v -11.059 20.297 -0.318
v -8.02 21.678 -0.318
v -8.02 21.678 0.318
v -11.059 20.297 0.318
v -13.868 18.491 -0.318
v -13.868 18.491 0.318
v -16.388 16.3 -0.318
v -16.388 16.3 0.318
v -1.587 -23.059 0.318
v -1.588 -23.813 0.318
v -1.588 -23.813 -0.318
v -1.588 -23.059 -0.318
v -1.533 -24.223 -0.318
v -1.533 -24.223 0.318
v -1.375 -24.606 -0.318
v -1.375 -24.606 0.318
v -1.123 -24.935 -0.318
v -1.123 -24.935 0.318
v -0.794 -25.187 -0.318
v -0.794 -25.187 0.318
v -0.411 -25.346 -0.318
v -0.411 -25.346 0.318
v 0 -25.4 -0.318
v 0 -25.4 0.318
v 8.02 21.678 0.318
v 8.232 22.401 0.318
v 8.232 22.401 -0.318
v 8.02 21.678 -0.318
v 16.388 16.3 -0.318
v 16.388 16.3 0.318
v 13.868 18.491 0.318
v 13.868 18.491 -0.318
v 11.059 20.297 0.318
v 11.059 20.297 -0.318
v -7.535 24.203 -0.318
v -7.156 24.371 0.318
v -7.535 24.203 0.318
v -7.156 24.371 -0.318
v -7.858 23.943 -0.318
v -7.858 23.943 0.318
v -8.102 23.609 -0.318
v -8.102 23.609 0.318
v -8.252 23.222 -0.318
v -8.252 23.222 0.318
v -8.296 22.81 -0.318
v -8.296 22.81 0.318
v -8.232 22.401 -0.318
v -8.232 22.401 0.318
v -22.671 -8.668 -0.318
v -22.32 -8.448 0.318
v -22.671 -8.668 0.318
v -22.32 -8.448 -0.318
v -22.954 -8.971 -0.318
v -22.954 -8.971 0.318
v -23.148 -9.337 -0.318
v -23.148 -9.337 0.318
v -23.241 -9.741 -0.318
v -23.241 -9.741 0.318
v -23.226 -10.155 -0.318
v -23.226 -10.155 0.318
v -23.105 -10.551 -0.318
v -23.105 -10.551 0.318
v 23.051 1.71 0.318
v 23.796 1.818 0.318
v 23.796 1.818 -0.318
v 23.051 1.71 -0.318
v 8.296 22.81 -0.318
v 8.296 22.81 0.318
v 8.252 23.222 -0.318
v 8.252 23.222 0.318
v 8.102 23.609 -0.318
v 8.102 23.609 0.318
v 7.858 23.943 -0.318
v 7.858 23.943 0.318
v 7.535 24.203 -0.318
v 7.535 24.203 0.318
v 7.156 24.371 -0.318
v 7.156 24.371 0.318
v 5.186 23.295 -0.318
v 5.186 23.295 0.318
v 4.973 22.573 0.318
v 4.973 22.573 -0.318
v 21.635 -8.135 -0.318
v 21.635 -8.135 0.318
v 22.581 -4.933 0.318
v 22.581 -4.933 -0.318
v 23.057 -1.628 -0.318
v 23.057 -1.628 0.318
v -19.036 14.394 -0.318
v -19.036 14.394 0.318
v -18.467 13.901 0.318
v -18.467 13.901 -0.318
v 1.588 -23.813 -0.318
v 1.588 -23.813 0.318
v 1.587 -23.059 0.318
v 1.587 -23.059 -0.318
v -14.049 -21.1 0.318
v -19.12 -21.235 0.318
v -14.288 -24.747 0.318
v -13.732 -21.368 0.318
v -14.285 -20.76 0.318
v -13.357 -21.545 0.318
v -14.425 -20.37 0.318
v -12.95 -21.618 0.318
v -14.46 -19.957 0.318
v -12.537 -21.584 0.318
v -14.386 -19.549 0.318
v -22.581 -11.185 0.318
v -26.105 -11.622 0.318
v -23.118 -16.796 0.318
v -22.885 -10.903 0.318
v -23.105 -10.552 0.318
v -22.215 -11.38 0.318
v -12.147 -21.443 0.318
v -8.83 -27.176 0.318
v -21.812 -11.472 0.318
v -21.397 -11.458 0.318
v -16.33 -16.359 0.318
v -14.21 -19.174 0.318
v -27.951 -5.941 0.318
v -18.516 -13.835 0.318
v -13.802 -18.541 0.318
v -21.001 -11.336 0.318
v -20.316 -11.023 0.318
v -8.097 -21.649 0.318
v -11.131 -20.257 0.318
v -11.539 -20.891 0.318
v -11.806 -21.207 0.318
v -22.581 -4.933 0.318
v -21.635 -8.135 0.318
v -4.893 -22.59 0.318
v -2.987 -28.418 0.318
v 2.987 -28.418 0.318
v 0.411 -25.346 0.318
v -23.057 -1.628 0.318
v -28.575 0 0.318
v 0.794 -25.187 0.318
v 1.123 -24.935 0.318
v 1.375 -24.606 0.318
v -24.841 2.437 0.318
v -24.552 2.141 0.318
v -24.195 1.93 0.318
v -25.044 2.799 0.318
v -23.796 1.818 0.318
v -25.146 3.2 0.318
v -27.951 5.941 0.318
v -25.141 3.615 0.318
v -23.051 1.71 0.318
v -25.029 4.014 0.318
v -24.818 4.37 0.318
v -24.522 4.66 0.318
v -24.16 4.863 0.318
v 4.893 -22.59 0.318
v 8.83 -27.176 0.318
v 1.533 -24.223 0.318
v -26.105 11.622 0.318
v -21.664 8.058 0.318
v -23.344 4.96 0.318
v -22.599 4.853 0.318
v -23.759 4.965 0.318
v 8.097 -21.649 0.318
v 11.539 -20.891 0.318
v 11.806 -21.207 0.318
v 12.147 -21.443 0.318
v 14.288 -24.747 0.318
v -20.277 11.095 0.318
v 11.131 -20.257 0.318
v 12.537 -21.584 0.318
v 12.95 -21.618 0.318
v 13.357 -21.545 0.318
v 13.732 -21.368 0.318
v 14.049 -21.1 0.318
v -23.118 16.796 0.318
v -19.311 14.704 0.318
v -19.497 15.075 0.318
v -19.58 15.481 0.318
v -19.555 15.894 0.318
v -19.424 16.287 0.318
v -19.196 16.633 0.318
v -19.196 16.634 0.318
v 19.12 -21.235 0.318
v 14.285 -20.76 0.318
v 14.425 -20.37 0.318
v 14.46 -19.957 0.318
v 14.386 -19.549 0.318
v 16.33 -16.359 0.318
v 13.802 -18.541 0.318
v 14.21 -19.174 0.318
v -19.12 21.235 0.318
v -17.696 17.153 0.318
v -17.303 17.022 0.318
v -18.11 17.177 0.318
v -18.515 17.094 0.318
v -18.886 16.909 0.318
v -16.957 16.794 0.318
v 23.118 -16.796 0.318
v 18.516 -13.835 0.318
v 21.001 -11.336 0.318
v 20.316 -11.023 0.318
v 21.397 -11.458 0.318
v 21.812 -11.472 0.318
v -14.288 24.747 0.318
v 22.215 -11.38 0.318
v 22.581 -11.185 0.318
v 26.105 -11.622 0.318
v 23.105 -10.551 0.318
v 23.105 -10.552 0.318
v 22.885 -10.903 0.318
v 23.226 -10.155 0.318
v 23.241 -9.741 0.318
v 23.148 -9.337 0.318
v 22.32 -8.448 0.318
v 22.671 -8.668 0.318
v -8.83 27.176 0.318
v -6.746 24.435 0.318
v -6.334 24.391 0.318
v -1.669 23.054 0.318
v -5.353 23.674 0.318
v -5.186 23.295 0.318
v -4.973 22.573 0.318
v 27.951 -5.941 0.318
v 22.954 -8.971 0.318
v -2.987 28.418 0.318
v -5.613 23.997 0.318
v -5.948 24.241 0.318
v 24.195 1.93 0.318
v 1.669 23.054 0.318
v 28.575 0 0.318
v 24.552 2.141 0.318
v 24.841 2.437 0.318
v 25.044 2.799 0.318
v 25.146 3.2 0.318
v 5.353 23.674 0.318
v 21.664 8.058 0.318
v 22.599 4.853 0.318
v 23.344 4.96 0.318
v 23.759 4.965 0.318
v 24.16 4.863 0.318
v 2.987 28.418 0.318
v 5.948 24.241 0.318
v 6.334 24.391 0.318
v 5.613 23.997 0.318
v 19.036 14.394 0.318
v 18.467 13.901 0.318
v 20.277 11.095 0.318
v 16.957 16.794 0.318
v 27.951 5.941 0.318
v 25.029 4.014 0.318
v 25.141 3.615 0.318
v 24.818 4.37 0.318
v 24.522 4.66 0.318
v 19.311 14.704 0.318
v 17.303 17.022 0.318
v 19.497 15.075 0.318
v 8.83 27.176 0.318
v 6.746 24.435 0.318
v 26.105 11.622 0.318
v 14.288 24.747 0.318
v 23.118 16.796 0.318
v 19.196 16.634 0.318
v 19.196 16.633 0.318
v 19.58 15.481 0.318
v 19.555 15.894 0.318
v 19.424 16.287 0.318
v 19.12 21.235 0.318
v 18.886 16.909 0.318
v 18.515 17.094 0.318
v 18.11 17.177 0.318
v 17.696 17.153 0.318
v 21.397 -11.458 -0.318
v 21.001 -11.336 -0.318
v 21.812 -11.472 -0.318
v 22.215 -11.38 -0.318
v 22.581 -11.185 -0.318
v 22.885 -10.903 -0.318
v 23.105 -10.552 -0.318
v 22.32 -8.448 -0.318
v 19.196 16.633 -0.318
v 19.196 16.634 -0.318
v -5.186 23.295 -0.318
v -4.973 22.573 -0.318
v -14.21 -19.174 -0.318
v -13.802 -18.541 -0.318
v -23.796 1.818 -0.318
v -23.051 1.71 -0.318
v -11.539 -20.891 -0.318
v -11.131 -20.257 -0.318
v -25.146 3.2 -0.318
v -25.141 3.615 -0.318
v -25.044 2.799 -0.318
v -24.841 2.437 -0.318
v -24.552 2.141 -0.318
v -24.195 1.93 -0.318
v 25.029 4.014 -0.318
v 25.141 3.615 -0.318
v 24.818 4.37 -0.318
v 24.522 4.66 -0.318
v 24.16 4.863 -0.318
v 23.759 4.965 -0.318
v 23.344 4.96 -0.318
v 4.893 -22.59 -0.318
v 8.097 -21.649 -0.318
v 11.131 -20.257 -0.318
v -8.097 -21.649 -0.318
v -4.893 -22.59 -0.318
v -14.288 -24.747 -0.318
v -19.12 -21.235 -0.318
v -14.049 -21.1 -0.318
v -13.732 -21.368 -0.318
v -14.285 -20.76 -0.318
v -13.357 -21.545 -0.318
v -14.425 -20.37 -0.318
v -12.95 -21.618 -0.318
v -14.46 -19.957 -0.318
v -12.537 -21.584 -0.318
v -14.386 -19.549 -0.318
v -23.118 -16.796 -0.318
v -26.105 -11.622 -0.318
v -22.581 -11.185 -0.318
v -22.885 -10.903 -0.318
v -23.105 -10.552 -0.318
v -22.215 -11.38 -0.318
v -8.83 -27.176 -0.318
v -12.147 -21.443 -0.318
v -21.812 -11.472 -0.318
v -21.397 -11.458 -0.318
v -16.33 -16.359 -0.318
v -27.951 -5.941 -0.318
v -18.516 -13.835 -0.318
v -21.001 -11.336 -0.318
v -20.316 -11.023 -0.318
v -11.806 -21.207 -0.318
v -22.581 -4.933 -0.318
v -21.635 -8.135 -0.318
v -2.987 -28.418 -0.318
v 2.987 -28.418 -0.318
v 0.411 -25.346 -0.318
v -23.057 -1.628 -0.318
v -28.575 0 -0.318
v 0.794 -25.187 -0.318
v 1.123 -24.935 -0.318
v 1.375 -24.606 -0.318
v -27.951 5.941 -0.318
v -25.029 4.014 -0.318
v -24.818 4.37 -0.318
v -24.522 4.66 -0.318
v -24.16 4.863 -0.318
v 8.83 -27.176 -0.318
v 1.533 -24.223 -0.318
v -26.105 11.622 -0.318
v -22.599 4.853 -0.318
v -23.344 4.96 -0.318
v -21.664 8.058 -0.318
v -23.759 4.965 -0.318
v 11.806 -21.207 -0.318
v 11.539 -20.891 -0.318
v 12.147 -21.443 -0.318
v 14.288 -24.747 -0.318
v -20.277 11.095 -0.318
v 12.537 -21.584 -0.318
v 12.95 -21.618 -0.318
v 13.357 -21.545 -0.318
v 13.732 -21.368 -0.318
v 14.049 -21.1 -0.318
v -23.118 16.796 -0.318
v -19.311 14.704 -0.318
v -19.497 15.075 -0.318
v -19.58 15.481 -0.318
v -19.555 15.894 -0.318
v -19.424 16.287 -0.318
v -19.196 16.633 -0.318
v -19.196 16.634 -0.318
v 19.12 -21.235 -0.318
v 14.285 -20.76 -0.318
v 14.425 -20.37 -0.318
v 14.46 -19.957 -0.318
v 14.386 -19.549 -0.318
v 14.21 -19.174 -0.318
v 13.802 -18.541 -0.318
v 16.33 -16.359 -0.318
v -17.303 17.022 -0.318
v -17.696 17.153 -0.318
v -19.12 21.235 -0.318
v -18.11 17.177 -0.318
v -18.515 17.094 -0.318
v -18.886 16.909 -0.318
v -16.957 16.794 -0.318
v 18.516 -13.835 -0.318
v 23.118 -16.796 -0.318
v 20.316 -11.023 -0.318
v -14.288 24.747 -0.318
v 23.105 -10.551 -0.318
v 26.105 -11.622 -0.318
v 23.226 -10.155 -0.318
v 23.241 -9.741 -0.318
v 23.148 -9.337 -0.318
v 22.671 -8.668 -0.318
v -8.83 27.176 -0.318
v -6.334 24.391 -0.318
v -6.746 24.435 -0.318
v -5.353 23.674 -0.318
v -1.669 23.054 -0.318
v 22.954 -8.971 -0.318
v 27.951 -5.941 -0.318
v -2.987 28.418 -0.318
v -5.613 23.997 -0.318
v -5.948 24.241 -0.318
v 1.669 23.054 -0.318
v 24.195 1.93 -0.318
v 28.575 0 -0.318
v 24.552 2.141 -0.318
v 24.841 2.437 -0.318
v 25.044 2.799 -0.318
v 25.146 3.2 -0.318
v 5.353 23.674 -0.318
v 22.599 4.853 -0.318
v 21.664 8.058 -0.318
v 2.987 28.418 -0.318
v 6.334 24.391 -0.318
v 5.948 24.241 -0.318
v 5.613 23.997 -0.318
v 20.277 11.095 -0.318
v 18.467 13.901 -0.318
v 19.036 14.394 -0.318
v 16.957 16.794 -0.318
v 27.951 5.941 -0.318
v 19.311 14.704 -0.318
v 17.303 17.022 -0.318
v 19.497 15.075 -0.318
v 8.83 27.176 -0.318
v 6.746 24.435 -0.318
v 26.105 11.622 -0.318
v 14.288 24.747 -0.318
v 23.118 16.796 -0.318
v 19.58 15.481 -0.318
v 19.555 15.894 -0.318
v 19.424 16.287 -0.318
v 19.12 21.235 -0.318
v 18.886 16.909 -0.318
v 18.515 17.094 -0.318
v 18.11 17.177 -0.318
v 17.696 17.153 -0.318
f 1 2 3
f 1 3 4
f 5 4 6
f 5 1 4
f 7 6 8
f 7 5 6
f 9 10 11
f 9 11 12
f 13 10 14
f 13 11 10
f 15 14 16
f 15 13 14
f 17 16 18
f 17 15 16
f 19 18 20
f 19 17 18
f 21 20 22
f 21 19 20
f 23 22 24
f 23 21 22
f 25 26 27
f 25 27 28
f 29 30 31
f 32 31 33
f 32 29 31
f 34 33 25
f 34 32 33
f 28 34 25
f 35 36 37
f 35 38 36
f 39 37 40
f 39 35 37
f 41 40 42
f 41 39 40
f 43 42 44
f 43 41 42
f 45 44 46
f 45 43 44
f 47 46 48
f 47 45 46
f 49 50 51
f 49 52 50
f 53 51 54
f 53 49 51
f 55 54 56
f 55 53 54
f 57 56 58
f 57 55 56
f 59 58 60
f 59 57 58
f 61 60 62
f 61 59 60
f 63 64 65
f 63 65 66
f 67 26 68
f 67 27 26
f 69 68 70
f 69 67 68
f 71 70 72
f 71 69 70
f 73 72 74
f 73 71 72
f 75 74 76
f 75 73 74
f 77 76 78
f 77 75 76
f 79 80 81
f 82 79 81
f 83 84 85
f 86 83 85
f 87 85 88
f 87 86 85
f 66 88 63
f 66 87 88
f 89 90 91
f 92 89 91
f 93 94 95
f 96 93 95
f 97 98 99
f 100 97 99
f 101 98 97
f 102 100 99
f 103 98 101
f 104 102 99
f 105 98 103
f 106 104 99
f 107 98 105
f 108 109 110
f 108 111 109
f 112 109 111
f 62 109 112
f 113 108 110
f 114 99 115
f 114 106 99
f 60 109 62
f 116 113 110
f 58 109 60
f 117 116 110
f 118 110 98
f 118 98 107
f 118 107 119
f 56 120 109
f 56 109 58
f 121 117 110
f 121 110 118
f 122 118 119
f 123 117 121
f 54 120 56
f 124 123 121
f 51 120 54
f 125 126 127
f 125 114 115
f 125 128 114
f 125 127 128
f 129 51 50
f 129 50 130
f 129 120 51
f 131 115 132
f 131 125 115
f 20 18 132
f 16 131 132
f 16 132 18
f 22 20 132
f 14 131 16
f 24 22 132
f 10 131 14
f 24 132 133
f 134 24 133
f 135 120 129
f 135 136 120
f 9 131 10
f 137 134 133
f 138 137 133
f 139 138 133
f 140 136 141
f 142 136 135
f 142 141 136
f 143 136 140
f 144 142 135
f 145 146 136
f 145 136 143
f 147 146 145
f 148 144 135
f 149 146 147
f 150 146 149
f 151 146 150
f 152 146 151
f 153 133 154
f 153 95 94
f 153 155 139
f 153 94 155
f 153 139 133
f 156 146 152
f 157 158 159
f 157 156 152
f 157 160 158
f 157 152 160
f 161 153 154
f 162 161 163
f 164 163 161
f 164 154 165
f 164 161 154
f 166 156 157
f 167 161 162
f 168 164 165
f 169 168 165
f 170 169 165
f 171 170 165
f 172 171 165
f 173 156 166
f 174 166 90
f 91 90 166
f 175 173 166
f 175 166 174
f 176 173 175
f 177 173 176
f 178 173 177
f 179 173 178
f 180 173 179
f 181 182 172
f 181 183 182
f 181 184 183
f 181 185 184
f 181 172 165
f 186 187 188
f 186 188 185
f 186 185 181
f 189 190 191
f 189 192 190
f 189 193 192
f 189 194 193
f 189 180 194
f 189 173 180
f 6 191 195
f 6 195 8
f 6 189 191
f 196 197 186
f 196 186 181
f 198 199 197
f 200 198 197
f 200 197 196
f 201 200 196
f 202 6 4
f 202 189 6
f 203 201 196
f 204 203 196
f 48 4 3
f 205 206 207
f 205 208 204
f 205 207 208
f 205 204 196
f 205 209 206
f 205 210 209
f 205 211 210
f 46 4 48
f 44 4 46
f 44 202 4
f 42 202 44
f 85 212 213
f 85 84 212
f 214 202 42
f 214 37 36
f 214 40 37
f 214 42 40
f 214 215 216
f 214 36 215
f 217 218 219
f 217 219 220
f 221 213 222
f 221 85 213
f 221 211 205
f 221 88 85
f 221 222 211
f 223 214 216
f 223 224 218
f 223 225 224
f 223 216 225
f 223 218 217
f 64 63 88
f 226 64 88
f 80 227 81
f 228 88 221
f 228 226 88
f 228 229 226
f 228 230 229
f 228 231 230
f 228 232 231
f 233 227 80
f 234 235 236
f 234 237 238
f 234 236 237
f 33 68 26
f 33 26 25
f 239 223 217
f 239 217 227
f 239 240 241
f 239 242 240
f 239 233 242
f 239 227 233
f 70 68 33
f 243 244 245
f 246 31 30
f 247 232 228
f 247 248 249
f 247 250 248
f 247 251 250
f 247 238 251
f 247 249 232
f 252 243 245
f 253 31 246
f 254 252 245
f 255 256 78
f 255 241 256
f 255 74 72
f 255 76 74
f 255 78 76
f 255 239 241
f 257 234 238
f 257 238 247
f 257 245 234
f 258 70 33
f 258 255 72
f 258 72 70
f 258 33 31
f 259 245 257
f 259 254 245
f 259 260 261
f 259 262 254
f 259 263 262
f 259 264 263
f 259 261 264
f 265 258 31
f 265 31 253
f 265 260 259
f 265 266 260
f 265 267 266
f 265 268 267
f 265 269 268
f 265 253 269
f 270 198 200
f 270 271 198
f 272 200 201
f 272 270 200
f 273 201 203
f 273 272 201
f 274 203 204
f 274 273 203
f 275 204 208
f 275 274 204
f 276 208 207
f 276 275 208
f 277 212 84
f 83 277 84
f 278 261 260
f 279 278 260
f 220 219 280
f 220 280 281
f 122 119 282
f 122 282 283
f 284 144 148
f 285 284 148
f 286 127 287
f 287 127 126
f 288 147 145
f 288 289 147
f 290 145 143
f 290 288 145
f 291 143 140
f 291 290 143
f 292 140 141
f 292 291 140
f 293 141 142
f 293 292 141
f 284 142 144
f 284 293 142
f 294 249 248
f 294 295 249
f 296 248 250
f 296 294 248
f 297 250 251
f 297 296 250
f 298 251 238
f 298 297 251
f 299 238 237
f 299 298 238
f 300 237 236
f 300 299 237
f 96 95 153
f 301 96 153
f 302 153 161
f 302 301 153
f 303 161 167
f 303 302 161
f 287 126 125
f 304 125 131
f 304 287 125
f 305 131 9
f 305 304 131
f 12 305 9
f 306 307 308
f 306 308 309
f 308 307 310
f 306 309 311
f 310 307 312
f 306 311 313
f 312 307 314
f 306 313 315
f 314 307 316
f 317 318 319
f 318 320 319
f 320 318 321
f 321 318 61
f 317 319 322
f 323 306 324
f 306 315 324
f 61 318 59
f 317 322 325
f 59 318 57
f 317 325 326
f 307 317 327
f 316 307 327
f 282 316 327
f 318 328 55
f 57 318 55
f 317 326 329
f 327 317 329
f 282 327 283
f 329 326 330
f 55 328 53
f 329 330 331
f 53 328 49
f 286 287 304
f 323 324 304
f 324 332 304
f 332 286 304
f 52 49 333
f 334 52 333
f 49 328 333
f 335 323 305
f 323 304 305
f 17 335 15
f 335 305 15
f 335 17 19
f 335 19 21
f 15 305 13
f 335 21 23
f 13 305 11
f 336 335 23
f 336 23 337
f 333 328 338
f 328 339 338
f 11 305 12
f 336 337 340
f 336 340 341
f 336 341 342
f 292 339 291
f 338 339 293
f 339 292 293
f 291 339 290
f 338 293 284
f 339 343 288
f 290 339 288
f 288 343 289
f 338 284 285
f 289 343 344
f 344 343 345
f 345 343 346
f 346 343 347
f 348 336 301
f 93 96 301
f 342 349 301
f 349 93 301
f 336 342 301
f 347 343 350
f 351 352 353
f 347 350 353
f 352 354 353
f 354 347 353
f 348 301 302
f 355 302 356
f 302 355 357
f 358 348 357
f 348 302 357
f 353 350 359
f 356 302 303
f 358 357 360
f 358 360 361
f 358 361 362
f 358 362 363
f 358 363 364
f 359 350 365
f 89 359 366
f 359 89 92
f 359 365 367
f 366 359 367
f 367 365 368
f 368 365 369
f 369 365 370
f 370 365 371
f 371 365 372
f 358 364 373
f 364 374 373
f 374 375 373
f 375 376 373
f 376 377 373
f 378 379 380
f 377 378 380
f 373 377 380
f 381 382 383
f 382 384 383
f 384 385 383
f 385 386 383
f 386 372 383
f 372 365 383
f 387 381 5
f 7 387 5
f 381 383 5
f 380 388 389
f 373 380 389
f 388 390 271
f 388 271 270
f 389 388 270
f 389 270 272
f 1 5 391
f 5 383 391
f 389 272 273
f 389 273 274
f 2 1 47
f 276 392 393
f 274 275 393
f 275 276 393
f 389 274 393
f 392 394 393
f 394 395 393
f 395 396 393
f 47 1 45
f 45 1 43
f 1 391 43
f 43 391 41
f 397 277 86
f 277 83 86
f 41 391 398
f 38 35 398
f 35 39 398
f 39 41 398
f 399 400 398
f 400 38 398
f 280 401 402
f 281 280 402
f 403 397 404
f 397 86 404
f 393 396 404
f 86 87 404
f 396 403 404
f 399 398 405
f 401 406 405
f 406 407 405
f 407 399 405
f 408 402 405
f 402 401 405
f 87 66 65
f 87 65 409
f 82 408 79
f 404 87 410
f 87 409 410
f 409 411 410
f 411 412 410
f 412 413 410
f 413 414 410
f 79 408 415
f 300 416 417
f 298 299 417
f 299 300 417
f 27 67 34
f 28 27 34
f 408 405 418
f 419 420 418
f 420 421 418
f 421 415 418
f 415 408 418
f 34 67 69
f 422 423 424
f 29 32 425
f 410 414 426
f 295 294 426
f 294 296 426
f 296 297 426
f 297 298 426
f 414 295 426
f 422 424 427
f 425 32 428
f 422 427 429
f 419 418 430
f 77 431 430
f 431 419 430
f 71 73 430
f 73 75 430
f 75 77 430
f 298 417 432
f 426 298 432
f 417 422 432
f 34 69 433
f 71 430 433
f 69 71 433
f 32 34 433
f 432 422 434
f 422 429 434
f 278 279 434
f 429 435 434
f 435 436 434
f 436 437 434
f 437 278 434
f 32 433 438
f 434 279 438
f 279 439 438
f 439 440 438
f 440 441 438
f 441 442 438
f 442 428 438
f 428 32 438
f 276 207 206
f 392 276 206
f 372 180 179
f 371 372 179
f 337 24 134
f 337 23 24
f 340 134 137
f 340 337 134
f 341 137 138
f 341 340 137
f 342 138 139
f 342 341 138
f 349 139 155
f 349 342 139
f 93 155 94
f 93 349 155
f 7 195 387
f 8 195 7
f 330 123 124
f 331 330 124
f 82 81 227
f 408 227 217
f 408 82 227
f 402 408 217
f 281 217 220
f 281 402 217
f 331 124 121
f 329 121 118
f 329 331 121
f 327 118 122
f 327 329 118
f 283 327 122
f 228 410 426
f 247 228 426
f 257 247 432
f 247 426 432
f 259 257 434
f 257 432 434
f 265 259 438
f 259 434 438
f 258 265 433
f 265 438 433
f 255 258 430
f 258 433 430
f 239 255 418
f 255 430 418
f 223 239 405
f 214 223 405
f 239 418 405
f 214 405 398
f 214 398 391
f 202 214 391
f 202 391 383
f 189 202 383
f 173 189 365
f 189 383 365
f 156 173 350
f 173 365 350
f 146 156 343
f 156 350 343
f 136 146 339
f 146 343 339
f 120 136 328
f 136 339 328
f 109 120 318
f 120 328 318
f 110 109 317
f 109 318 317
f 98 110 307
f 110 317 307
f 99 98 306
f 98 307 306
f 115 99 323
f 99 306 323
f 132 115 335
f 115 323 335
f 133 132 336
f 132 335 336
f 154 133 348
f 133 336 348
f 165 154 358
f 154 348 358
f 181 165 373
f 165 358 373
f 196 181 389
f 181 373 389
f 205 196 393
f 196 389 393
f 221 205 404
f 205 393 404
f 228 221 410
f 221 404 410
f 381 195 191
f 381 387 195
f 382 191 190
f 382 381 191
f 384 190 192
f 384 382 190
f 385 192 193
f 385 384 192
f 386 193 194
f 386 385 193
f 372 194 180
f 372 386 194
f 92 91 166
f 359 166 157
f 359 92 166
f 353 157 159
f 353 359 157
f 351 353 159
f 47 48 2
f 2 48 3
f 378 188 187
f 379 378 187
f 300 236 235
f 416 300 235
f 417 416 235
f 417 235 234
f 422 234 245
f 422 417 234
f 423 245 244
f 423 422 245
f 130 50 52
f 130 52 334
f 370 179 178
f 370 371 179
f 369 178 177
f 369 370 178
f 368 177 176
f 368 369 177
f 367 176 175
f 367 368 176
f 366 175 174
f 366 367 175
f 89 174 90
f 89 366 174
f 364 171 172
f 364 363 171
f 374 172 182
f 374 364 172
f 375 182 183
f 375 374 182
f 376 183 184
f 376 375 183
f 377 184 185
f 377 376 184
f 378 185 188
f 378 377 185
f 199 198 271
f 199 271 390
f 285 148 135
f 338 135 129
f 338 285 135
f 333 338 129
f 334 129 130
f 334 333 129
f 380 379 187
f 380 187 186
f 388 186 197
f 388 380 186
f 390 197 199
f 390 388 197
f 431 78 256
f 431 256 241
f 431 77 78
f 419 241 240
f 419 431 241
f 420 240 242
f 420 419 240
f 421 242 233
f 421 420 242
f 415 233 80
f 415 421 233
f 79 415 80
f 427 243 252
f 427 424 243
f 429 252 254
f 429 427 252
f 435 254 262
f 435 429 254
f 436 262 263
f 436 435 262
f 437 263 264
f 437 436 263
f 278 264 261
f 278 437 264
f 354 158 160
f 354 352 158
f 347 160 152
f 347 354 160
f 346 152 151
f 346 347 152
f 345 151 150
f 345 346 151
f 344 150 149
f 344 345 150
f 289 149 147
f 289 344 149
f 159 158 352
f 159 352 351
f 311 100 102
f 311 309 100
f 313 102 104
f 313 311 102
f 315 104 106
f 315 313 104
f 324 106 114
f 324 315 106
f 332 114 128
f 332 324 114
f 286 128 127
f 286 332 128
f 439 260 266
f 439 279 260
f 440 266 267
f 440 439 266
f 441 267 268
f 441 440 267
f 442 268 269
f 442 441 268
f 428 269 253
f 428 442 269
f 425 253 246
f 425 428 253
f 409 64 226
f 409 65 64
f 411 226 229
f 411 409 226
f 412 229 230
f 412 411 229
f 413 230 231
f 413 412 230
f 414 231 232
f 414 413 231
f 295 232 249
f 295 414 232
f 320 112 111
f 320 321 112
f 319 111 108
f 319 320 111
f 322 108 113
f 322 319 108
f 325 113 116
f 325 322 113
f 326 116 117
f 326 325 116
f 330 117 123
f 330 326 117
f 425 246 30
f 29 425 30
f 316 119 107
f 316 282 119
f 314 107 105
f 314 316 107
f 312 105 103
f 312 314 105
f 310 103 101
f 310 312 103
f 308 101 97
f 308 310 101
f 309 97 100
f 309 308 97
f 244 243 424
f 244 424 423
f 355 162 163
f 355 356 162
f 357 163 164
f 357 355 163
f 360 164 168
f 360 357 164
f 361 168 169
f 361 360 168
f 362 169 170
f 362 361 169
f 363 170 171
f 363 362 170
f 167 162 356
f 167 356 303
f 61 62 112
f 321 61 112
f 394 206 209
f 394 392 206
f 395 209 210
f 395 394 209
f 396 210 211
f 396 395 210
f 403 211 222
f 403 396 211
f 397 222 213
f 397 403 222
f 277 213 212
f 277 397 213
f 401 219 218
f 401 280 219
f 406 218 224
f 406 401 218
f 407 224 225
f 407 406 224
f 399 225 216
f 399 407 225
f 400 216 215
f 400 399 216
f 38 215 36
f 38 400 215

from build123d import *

# Parameters (mm, degrees)
BOSS_EXTRUDE1_DEPTH      = 0.3175
BOSS_EXTRUDE1_DEPTH_BACK = 0.3175
SKETCH1_R                = 28.575
SKETCH1_R_2              = 23.114
SKETCH4_W                = 3.175
SKETCH4_H                = 6.35
CUT_EXTRUDE2_DEPTH       = 41.416141268
FILLET1_R                = 1.5875
CIRPATTERN1_COUNT        = 11
FILLET1_OF_CIRPATTERN1_R = 1.5875


with BuildPart() as part:
    # Sketch1 → Boss-Extrude1 (new, two sides: drawn at the far end of the back side and taken through both)
    with BuildSketch(Plane.XY.offset(-BOSS_EXTRUDE1_DEPTH_BACK)):
        Circle(SKETCH1_R)
        Circle(SKETCH1_R_2, mode=Mode.SUBTRACT)
    extrude(amount=BOSS_EXTRUDE1_DEPTH + BOSS_EXTRUDE1_DEPTH_BACK)

    # Sketch4 → Cut-Extrude2 (cut, through all)
    with BuildSketch(Plane.XY.offset(0.3175)):
        with Locations((0, -22.225)):
            Rectangle(SKETCH4_W, SKETCH4_H)
    cut_extrude2 = extrude(amount=-CUT_EXTRUDE2_DEPTH, mode=Mode.SUBTRACT)

    # Fillet1
    fillet1_edges = [part.edges().sort_by_distance(p)[0] for p in [
        (1.5875, -25.4, 0),
        (-1.5875, -25.4, 0),
    ]]
    fillet(fillet1_edges, radius=FILLET1_R - 0.0001)  # a hair under: the kernel refuses the full size

    # CirPattern1: Cut-Extrude2 ×11 about axis
    cirpattern1_axis = Axis((0, 0, 0), (0, 0, 1))
    for i in range(1, CIRPATTERN1_COUNT):
        add(cut_extrude2.rotate(cirpattern1_axis, i * 360 / CIRPATTERN1_COUNT), mode=Mode.SUBTRACT)

    # Fillet1 of CirPattern1
    fillet1_of_cirpattern1_edges = [part.edges().sort_by_distance(p)[0] for p in [
        (15.067766747, -20.509572436, 0),
        (12.39678678, -22.226107032, 0),
        (23.764124015, -9.107500538, 0),
        (22.445181349, -11.995582123, 0),
        (24.915539818, 5.186138431, 0),
        (25.36738943, 2.043455353, 0),
        (18.156447773, 17.833215091, 0),
        (20.235630604, 15.433710193, 0),
        (5.632811848, 24.818371964, 0),
        (8.679202039, 23.923871096, 0),
        (-8.679202039, 23.923871096, 0),
        (-5.632811848, 24.818371964, 0),
        (-20.235630604, 15.433710193, 0),
        (-18.156447773, 17.833215091, 0),
        (-25.36738943, 2.043455353, 0),
        (-24.915539818, 5.186138431, 0),
        (-22.445181349, -11.995582123, 0),
        (-23.764124015, -9.107500538, 0),
        (-12.39678678, -22.226107032, 0),
        (-15.067766747, -20.509572436, 0),
    ]]
    fillet(fillet1_of_cirpattern1_edges, radius=FILLET1_OF_CIRPATTERN1_R - 0.0001)  # a hair under: the kernel refuses the full size


solid = part.part
